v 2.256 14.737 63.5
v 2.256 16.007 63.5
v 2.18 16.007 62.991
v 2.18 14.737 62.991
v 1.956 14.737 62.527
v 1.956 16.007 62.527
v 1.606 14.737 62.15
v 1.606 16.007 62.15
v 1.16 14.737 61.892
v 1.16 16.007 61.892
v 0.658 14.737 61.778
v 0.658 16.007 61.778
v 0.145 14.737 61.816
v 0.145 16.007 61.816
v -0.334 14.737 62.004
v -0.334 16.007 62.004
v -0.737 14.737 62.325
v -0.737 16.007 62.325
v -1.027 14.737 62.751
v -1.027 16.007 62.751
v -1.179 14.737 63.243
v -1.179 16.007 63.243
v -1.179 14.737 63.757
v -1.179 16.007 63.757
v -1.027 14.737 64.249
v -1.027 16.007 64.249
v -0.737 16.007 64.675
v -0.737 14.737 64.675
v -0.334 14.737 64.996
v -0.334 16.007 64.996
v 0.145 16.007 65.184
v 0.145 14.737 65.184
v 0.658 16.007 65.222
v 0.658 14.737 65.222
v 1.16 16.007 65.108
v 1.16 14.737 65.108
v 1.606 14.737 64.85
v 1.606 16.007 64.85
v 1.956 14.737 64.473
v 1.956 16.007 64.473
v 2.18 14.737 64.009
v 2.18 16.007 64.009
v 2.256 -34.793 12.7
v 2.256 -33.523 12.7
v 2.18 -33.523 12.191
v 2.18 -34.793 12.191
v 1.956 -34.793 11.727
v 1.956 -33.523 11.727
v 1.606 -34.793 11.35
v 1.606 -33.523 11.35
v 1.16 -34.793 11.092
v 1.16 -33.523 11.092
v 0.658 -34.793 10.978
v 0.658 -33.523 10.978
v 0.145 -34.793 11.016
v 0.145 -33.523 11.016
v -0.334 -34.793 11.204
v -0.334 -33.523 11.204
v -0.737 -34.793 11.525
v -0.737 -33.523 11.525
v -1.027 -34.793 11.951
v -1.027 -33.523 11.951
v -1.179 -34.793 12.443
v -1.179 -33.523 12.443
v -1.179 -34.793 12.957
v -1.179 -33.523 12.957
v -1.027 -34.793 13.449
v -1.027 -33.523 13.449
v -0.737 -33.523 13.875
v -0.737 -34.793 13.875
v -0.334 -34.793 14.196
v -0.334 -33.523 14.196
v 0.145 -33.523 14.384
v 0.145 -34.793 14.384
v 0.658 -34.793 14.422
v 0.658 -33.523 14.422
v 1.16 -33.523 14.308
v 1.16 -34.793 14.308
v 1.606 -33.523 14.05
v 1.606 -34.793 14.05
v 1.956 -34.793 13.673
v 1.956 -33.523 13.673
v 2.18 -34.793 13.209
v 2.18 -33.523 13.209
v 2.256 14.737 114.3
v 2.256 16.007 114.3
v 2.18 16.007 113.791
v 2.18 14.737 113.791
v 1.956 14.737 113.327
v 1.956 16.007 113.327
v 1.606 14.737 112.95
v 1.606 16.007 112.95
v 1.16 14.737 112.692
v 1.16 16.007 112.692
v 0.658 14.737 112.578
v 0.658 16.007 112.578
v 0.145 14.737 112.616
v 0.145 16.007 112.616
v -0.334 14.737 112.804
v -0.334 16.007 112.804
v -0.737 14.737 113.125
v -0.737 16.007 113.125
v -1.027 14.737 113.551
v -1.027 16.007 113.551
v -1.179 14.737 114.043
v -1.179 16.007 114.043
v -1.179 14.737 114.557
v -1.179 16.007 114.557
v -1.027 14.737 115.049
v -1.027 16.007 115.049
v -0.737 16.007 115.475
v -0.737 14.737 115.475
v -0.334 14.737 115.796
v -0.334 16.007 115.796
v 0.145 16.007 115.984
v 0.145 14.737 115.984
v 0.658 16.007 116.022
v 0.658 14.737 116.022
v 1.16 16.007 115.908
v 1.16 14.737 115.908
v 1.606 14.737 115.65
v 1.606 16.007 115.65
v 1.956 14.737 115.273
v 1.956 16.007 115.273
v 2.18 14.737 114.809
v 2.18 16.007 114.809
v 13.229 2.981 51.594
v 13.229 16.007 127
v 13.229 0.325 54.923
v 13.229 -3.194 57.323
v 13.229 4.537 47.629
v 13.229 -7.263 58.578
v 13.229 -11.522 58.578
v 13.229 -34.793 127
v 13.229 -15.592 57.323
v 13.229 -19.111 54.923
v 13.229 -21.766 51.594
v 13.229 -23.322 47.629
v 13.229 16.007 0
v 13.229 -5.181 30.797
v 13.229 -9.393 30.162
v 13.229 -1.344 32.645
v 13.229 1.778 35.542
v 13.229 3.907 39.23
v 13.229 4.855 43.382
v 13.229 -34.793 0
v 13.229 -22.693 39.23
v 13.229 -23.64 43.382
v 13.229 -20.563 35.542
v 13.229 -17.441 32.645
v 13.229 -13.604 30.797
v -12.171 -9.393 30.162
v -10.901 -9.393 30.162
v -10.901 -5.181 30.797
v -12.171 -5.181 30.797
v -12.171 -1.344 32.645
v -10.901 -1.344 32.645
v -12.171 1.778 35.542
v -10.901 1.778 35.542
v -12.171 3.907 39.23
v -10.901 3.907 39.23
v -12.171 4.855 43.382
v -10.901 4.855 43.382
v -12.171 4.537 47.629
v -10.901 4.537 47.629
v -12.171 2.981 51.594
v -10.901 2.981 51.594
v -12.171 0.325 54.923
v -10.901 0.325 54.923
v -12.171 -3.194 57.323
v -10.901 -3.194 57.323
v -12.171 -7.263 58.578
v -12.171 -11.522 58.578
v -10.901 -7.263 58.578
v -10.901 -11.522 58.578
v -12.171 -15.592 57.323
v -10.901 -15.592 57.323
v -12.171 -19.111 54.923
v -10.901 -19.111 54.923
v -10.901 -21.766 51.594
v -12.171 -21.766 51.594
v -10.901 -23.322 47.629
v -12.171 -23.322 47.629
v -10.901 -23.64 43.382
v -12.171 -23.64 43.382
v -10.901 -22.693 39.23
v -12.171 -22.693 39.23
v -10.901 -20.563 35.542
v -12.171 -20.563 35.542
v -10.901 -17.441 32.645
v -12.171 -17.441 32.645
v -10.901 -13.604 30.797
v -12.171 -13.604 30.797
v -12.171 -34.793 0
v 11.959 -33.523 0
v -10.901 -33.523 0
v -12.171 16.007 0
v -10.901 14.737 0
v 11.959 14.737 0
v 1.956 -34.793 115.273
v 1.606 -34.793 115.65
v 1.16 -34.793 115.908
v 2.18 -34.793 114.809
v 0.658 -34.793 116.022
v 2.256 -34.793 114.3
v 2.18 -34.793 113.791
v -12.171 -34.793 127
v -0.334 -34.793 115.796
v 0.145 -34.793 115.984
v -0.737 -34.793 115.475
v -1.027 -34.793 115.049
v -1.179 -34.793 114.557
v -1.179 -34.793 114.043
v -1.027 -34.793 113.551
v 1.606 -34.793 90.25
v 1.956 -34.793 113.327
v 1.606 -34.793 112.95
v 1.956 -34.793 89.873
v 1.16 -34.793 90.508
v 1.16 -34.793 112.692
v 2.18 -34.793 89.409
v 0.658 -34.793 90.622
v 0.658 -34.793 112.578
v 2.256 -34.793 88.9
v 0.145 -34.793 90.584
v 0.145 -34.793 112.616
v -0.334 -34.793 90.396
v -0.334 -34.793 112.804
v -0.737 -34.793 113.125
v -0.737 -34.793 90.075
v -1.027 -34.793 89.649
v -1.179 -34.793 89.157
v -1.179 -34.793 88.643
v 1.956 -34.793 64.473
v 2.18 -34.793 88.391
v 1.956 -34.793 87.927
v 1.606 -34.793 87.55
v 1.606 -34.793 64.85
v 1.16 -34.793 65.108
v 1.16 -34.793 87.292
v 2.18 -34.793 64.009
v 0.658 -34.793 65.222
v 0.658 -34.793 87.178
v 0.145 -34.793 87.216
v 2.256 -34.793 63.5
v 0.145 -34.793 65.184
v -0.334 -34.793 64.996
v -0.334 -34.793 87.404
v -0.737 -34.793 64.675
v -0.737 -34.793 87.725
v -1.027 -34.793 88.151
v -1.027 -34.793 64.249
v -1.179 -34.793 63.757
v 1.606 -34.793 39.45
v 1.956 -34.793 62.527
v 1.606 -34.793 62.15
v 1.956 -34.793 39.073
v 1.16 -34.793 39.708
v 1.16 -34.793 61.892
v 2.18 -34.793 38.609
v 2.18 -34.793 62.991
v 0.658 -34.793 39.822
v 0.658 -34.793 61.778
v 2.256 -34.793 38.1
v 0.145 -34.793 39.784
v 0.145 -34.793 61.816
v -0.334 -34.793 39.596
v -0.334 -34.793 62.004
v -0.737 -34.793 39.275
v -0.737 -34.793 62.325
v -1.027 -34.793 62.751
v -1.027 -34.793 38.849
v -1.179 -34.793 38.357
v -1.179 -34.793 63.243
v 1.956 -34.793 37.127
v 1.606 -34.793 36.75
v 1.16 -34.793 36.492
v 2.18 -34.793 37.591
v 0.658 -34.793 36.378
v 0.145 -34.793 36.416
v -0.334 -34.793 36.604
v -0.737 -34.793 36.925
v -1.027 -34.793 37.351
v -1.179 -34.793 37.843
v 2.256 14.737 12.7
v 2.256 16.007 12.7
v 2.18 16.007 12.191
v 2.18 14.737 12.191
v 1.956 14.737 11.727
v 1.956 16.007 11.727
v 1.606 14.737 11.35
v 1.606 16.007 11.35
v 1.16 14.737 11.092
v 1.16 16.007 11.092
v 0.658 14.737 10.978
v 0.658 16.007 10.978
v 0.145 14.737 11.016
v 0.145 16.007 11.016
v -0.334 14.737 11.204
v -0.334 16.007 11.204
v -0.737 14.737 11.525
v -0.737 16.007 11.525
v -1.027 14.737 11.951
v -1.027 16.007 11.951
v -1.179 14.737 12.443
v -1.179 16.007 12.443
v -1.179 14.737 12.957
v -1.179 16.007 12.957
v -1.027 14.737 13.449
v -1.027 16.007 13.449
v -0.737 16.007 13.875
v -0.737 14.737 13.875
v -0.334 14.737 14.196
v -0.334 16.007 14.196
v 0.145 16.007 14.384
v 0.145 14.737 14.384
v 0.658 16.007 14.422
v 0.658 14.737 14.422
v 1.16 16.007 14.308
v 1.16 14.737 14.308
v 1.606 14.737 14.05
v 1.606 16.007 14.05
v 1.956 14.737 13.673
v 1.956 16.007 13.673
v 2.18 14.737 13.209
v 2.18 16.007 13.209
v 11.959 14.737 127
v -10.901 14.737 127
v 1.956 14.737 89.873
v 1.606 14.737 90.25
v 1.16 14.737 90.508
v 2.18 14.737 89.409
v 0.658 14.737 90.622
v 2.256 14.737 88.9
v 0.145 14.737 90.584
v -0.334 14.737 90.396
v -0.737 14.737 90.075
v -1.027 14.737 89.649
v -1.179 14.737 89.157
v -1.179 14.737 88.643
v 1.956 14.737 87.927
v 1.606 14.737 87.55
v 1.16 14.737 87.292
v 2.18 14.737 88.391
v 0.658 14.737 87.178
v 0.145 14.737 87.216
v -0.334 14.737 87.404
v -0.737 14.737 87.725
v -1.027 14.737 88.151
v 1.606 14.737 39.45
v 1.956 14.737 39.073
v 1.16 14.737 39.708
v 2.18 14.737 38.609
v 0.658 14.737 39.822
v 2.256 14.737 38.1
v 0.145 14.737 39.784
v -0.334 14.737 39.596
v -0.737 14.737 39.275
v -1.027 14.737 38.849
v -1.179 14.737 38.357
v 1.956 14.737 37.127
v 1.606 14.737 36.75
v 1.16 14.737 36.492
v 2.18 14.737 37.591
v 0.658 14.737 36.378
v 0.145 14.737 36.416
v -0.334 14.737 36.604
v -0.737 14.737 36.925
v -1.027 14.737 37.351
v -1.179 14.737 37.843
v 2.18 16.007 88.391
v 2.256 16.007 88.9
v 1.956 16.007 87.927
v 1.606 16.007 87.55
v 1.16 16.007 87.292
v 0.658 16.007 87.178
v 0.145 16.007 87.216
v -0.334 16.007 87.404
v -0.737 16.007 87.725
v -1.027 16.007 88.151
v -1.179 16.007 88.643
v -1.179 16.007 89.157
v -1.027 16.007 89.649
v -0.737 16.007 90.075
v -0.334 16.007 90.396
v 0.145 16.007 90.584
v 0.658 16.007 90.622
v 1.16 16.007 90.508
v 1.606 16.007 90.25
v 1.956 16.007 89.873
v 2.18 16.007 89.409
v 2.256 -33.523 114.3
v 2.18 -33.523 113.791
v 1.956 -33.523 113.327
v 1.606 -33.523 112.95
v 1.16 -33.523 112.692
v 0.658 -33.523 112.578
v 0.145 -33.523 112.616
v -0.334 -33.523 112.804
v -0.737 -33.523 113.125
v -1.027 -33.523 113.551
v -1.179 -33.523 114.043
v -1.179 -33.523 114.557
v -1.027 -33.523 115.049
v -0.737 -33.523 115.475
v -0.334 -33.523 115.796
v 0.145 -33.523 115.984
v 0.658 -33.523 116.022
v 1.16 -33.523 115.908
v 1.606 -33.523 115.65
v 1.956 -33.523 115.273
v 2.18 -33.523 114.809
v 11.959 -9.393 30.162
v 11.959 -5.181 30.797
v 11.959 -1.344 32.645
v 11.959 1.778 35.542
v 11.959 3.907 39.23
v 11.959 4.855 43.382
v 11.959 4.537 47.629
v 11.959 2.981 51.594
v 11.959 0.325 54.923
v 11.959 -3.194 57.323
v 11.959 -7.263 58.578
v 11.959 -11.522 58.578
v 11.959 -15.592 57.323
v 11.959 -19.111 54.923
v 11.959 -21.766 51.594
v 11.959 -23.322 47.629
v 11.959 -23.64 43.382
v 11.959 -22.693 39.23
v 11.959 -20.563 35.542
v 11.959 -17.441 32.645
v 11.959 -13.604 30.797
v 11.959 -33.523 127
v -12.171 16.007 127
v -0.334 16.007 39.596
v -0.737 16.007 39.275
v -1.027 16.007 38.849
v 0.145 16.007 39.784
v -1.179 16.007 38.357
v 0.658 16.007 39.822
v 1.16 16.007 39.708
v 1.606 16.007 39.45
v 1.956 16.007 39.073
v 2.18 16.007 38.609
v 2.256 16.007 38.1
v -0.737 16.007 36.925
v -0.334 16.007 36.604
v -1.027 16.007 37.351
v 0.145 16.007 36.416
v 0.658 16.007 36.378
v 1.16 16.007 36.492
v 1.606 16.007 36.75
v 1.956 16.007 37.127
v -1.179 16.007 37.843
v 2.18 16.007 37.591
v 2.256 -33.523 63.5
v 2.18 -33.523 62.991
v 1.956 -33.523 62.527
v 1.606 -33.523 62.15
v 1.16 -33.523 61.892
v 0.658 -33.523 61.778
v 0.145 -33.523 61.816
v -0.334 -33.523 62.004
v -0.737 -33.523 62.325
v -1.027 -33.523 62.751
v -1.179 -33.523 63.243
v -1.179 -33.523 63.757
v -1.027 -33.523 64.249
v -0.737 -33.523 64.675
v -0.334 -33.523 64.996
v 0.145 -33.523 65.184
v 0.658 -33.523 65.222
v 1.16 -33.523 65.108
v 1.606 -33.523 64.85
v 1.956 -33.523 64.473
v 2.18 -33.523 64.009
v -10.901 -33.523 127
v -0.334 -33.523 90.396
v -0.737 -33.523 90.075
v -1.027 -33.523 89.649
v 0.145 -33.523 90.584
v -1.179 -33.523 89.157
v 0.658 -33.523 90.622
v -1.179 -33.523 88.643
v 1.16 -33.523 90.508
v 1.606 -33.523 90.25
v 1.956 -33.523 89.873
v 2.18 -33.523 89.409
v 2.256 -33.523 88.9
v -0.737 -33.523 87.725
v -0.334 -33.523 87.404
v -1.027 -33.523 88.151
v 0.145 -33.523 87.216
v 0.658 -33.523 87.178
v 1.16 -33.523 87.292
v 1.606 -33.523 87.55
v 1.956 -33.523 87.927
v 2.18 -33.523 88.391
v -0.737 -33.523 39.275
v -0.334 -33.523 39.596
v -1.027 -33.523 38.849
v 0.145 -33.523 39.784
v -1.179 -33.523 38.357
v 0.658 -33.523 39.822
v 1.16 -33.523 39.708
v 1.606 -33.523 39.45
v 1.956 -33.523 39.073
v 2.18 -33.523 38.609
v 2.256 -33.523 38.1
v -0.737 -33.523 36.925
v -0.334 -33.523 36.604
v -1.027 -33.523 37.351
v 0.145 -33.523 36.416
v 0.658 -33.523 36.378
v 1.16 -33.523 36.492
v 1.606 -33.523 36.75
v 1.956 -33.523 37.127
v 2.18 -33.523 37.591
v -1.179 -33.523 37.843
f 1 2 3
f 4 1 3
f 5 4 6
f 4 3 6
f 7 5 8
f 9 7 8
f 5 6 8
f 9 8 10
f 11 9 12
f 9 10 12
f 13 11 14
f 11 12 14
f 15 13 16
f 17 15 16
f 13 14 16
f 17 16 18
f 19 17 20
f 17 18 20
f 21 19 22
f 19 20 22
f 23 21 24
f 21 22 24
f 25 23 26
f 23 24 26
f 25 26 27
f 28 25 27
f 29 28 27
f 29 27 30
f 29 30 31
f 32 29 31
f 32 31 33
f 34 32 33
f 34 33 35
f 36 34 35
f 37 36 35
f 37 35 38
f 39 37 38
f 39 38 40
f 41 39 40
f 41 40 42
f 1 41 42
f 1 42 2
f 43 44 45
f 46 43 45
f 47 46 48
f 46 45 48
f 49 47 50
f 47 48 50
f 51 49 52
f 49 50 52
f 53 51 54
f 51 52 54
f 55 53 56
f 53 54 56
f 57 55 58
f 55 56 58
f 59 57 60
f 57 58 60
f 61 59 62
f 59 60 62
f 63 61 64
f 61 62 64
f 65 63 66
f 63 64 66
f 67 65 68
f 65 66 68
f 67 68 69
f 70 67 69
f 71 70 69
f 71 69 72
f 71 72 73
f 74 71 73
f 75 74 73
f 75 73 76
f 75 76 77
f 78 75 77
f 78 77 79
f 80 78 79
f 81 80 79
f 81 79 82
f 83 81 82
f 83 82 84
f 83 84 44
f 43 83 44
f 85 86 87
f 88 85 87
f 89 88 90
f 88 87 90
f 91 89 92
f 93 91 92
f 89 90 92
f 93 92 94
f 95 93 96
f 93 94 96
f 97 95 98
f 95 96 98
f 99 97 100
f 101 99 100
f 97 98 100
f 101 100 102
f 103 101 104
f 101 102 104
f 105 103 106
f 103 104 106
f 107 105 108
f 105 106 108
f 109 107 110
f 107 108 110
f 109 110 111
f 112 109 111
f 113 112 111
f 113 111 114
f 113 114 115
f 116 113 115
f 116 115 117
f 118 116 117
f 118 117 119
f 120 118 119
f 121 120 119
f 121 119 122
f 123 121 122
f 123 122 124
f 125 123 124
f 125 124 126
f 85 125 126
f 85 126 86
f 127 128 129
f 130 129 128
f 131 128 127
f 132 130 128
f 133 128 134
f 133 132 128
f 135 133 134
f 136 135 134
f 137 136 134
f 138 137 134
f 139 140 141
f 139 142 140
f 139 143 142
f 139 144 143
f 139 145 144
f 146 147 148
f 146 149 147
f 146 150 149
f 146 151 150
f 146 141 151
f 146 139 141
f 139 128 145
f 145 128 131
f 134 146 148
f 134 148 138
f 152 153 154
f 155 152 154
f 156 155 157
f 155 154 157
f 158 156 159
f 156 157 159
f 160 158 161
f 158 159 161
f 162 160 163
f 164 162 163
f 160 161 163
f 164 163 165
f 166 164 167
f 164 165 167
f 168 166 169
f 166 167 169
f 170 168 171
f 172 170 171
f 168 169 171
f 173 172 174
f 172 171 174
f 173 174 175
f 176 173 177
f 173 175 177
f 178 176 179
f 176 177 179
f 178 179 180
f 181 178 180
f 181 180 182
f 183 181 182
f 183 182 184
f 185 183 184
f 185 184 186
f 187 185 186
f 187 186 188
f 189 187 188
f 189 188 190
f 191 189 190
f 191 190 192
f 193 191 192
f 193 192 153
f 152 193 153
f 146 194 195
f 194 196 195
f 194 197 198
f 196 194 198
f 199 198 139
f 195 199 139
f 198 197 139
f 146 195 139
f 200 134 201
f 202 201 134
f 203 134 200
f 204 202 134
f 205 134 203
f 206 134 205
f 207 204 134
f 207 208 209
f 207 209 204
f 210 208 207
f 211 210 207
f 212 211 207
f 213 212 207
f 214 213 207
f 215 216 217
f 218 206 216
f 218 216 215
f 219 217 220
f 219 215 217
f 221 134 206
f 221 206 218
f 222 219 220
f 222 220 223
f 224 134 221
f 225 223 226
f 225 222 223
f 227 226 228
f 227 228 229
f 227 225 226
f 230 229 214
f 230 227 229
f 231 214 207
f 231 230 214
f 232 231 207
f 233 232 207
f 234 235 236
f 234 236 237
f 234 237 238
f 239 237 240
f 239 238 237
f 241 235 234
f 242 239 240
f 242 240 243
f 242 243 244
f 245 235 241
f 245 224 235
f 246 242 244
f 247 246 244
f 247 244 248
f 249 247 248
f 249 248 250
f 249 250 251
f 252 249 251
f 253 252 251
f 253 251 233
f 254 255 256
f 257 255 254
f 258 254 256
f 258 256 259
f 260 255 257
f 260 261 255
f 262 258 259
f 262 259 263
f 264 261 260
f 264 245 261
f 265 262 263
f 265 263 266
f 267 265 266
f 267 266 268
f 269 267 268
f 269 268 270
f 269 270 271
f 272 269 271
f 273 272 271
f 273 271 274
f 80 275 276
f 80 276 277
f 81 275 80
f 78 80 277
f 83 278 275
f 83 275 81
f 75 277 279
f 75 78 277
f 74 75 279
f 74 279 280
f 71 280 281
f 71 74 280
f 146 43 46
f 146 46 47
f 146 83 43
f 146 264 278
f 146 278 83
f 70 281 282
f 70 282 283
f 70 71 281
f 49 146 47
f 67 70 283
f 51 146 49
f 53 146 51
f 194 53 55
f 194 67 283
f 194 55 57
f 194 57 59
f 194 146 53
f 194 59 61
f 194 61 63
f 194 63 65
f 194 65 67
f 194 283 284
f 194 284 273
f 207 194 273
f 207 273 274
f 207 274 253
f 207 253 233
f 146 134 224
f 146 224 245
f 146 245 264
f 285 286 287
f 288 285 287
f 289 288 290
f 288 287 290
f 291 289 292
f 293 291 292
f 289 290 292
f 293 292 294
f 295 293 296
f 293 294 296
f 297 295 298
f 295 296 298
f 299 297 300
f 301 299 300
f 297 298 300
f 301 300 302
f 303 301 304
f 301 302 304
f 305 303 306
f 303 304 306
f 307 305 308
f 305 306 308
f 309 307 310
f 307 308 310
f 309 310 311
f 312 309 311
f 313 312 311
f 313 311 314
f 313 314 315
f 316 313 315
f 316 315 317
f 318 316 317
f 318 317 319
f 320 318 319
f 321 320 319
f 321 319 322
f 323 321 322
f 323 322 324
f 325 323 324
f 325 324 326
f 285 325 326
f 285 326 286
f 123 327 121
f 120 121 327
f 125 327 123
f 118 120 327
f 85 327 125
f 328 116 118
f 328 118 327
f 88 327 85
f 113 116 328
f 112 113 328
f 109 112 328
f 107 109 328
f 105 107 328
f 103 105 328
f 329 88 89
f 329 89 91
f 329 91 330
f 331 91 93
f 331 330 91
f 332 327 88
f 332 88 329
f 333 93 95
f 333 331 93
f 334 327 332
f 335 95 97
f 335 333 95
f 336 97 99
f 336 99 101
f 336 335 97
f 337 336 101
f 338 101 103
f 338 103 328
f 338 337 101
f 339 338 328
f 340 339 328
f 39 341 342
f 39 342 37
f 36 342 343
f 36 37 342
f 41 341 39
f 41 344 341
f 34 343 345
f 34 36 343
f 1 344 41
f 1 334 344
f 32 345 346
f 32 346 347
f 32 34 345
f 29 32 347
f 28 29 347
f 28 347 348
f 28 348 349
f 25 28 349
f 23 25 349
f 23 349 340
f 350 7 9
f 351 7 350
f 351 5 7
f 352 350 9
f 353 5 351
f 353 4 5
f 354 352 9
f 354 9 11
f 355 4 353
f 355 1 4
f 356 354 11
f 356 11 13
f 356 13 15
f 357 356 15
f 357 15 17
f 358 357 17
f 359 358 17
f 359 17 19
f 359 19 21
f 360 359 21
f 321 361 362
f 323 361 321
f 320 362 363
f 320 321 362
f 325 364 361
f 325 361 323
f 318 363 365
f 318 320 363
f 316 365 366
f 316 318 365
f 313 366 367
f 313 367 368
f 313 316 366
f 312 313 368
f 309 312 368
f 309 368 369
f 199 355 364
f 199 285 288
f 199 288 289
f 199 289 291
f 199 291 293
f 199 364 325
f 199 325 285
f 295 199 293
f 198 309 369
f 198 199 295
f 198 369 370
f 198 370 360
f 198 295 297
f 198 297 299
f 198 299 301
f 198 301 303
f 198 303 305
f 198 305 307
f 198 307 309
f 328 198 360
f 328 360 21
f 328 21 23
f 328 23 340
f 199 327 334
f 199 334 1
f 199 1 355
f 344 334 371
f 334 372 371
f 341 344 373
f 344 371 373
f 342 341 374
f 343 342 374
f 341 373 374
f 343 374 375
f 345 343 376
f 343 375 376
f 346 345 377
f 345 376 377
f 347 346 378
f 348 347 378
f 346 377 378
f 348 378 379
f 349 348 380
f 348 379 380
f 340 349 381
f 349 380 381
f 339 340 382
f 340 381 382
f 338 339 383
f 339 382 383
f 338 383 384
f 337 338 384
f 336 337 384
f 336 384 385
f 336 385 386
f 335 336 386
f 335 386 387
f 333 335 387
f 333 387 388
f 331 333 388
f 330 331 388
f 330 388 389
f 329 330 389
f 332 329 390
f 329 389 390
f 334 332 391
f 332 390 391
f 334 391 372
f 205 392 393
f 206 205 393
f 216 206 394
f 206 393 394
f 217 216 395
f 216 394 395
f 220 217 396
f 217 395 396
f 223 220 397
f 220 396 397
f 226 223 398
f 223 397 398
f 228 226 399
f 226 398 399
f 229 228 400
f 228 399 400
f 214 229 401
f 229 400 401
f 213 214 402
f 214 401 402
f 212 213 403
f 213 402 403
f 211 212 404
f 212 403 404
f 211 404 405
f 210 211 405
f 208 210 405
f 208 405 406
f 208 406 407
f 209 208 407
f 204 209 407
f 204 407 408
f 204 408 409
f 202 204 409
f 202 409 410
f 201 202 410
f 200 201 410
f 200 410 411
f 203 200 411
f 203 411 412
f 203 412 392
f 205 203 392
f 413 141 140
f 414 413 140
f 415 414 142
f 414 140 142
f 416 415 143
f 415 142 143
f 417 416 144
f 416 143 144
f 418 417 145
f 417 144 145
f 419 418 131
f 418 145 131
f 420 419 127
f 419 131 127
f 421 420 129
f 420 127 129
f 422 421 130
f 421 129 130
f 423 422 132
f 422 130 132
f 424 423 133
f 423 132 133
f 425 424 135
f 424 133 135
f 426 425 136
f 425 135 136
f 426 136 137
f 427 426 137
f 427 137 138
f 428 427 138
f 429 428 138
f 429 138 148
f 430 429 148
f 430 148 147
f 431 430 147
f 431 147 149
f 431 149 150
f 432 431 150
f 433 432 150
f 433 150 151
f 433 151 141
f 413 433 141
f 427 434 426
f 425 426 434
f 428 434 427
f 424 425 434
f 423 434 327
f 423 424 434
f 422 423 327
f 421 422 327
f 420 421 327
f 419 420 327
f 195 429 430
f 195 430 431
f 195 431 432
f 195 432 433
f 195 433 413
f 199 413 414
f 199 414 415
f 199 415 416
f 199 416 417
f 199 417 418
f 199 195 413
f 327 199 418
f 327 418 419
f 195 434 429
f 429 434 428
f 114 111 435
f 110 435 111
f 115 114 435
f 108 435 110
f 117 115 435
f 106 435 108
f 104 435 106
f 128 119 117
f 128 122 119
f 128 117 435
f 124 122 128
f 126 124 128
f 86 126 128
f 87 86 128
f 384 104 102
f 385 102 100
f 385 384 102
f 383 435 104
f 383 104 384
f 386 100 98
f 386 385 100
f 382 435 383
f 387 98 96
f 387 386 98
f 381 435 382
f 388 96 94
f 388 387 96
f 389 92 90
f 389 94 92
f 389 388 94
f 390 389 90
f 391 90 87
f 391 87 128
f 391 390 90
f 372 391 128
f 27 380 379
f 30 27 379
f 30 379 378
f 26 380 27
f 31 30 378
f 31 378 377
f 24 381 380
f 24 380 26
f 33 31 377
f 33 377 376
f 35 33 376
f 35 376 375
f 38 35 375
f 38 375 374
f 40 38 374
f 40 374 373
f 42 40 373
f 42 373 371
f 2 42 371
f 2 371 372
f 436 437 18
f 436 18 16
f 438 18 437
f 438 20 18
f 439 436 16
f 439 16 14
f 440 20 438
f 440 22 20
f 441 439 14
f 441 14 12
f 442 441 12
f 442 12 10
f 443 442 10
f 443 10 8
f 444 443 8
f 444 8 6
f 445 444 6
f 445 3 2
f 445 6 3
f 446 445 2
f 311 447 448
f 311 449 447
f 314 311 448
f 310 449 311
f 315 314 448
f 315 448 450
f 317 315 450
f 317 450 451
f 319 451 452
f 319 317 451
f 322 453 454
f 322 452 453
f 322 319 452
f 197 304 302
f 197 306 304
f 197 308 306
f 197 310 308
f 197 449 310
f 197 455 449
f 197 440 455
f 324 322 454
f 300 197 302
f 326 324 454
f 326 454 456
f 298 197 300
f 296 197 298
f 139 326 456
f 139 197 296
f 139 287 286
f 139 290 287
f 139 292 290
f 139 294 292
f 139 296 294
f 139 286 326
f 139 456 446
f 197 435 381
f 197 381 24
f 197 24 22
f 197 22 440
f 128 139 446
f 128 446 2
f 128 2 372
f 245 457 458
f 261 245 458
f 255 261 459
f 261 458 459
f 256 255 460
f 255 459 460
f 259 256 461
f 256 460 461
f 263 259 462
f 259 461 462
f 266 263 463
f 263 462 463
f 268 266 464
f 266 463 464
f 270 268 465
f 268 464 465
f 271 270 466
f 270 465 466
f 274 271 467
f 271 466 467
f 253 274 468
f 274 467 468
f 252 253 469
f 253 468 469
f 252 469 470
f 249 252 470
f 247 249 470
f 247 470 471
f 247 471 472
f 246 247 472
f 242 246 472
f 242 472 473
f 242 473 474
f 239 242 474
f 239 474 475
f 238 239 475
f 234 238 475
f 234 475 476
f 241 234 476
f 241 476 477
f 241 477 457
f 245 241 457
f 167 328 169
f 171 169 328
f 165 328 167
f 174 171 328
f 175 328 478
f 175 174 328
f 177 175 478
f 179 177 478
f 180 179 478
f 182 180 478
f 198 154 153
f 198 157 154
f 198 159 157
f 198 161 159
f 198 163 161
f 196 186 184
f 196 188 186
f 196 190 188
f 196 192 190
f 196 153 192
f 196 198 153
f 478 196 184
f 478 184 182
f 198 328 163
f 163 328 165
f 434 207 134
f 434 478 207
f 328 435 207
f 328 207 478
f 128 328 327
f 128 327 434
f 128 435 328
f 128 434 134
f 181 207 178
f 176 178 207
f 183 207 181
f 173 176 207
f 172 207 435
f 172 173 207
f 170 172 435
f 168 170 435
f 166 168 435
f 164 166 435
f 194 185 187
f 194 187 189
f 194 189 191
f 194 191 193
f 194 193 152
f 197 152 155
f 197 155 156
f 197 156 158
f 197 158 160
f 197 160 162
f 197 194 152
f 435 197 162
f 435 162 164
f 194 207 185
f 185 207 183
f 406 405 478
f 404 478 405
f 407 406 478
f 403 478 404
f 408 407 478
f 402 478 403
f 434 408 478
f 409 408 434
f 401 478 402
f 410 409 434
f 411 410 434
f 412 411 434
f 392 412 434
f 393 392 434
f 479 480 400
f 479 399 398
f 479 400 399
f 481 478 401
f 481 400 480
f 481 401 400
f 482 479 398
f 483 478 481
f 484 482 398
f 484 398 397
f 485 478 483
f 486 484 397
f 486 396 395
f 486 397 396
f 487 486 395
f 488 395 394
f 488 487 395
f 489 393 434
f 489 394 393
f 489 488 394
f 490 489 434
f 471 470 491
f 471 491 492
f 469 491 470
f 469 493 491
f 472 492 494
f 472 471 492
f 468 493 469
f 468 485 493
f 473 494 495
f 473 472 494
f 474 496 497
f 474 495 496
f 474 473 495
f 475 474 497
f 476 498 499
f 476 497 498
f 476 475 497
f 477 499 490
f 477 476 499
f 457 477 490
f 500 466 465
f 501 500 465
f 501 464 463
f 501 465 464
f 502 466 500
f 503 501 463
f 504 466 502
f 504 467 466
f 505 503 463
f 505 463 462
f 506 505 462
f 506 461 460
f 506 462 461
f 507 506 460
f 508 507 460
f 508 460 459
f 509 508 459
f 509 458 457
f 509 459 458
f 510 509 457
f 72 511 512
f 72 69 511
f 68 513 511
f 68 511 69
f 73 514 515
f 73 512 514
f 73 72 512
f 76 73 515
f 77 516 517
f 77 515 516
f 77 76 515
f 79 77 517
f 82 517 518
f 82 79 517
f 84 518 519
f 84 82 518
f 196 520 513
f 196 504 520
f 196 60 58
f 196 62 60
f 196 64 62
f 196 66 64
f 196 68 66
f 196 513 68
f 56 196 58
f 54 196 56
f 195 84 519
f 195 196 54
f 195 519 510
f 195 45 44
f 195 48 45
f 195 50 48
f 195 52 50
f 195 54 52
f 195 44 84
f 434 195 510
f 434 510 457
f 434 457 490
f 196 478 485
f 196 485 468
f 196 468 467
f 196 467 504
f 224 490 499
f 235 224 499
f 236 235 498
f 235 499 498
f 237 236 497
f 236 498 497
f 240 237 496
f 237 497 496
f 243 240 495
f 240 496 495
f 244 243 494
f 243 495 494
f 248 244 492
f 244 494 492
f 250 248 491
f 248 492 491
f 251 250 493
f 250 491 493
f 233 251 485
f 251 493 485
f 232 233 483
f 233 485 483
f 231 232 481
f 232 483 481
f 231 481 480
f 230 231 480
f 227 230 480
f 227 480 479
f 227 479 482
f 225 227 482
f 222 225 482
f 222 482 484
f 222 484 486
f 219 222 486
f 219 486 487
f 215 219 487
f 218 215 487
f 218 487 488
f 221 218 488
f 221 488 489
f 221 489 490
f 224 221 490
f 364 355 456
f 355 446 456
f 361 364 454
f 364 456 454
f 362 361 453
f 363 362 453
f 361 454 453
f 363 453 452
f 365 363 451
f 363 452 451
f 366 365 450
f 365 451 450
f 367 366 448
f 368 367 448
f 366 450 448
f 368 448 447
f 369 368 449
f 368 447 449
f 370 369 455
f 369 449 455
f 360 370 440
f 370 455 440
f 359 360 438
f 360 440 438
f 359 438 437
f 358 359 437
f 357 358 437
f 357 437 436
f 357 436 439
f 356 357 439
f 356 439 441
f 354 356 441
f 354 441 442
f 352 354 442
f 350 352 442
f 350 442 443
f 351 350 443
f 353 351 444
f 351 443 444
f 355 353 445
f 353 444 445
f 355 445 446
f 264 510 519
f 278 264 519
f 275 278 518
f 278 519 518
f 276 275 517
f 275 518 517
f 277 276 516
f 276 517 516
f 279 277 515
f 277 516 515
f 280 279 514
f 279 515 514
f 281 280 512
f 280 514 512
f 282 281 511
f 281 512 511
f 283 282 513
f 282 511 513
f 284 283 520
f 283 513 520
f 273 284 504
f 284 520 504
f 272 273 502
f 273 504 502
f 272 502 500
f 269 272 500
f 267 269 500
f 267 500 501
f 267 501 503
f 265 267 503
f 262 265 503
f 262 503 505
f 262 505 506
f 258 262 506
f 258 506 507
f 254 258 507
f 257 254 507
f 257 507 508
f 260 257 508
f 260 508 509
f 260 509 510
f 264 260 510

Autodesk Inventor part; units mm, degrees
ref_plane "YZ Plane" through (0, 0, 0) normal (1, 0, 0) x (0, 1, 0)
ref_plane "XZ Plane" through (0, 0, 0) normal (0, 1, 0) x (-1, 0, 0)
ref_plane "XY Plane" through (0, 0, 0) normal (0, 0, 1) x (1, 0, 0)
sketch "Sketch1" plane through (0, 0, 0) normal (0, 0, 1) x (1, 0, 0)
  line L0 (-12.1708, 16.0073) -> (13.2292, 16.0073)
  line L1 (13.2292, 16.0073) -> (13.2292, -34.7927)
  line L2 (13.2292, -34.7927) -> (-12.1708, -34.7927)
  line L3 (-12.1708, -34.7927) -> (-12.1708, 16.0073)
  line L4 (11.9592, 14.7373) -> (-10.9008, 14.7373)
  line L5 (-10.9008, 14.7373) -> (-10.9008, -33.5227)
  line L6 (-10.9008, -33.5227) -> (11.9592, -33.5227)
  line L7 (11.9592, -33.5227) -> (11.9592, 14.7373)
  point P0 (0, 0)
  dimension "d0" = 25.4
  dimension "d1" = 50.8
  dimension "d2" = 1.27
extrude "Extrusion1" add sketch "Sketch1" along normal blind 127
sketch "Sketch2" plane through (-12.1708, 16.0073, 0) normal (0, 1, 0) x (1, 0, 0)
  circle A0 centre (12.7, -12.7) radius 1.7272
  line L0 (25.4, 0) -> (0, 0) projected
  line L1 (0, 0) -> (0, -127) projected
  point P0 (12.1708, 0)
  dimension "d5" = 3.4544
  dimension "d6" = 12.7
  dimension "d7" = 12.7
extrude "Extrusion2" cut sketch "Sketch2" against normal through all
pattern_linear "Rectangular Pattern1" count 13 spacing 25.4 along (0, 0, 1) of "Extrusion2"
sketch "Sketch3" plane through (13.2292, -34.7927, 0) normal (1, 0, 0) x (0, 0, -1)
  circle A0 centre (-44.45, 25.4) radius 14.2875
  line L0 (-127, 0) -> (-127, 50.8) projected
  line L1 (0, 0) -> (0, 50.8) projected
  line L2 (0, 50.8) -> (-127, 50.8) projected
  point P0 (0, 34.7927)
  dimension "d15" = 28.575
  dimension "d18" = 25.4
  dimension "d21" = 44.45
extrude "Extrusion3" cut sketch "Sketch3" against normal blind 25.4
equation "\"d3\" = d13"
equation "\"d10\" = d14"
equation "\"d13\" = 127"
equation "\"d14\" = d13"
properties part number "RailSupp"
